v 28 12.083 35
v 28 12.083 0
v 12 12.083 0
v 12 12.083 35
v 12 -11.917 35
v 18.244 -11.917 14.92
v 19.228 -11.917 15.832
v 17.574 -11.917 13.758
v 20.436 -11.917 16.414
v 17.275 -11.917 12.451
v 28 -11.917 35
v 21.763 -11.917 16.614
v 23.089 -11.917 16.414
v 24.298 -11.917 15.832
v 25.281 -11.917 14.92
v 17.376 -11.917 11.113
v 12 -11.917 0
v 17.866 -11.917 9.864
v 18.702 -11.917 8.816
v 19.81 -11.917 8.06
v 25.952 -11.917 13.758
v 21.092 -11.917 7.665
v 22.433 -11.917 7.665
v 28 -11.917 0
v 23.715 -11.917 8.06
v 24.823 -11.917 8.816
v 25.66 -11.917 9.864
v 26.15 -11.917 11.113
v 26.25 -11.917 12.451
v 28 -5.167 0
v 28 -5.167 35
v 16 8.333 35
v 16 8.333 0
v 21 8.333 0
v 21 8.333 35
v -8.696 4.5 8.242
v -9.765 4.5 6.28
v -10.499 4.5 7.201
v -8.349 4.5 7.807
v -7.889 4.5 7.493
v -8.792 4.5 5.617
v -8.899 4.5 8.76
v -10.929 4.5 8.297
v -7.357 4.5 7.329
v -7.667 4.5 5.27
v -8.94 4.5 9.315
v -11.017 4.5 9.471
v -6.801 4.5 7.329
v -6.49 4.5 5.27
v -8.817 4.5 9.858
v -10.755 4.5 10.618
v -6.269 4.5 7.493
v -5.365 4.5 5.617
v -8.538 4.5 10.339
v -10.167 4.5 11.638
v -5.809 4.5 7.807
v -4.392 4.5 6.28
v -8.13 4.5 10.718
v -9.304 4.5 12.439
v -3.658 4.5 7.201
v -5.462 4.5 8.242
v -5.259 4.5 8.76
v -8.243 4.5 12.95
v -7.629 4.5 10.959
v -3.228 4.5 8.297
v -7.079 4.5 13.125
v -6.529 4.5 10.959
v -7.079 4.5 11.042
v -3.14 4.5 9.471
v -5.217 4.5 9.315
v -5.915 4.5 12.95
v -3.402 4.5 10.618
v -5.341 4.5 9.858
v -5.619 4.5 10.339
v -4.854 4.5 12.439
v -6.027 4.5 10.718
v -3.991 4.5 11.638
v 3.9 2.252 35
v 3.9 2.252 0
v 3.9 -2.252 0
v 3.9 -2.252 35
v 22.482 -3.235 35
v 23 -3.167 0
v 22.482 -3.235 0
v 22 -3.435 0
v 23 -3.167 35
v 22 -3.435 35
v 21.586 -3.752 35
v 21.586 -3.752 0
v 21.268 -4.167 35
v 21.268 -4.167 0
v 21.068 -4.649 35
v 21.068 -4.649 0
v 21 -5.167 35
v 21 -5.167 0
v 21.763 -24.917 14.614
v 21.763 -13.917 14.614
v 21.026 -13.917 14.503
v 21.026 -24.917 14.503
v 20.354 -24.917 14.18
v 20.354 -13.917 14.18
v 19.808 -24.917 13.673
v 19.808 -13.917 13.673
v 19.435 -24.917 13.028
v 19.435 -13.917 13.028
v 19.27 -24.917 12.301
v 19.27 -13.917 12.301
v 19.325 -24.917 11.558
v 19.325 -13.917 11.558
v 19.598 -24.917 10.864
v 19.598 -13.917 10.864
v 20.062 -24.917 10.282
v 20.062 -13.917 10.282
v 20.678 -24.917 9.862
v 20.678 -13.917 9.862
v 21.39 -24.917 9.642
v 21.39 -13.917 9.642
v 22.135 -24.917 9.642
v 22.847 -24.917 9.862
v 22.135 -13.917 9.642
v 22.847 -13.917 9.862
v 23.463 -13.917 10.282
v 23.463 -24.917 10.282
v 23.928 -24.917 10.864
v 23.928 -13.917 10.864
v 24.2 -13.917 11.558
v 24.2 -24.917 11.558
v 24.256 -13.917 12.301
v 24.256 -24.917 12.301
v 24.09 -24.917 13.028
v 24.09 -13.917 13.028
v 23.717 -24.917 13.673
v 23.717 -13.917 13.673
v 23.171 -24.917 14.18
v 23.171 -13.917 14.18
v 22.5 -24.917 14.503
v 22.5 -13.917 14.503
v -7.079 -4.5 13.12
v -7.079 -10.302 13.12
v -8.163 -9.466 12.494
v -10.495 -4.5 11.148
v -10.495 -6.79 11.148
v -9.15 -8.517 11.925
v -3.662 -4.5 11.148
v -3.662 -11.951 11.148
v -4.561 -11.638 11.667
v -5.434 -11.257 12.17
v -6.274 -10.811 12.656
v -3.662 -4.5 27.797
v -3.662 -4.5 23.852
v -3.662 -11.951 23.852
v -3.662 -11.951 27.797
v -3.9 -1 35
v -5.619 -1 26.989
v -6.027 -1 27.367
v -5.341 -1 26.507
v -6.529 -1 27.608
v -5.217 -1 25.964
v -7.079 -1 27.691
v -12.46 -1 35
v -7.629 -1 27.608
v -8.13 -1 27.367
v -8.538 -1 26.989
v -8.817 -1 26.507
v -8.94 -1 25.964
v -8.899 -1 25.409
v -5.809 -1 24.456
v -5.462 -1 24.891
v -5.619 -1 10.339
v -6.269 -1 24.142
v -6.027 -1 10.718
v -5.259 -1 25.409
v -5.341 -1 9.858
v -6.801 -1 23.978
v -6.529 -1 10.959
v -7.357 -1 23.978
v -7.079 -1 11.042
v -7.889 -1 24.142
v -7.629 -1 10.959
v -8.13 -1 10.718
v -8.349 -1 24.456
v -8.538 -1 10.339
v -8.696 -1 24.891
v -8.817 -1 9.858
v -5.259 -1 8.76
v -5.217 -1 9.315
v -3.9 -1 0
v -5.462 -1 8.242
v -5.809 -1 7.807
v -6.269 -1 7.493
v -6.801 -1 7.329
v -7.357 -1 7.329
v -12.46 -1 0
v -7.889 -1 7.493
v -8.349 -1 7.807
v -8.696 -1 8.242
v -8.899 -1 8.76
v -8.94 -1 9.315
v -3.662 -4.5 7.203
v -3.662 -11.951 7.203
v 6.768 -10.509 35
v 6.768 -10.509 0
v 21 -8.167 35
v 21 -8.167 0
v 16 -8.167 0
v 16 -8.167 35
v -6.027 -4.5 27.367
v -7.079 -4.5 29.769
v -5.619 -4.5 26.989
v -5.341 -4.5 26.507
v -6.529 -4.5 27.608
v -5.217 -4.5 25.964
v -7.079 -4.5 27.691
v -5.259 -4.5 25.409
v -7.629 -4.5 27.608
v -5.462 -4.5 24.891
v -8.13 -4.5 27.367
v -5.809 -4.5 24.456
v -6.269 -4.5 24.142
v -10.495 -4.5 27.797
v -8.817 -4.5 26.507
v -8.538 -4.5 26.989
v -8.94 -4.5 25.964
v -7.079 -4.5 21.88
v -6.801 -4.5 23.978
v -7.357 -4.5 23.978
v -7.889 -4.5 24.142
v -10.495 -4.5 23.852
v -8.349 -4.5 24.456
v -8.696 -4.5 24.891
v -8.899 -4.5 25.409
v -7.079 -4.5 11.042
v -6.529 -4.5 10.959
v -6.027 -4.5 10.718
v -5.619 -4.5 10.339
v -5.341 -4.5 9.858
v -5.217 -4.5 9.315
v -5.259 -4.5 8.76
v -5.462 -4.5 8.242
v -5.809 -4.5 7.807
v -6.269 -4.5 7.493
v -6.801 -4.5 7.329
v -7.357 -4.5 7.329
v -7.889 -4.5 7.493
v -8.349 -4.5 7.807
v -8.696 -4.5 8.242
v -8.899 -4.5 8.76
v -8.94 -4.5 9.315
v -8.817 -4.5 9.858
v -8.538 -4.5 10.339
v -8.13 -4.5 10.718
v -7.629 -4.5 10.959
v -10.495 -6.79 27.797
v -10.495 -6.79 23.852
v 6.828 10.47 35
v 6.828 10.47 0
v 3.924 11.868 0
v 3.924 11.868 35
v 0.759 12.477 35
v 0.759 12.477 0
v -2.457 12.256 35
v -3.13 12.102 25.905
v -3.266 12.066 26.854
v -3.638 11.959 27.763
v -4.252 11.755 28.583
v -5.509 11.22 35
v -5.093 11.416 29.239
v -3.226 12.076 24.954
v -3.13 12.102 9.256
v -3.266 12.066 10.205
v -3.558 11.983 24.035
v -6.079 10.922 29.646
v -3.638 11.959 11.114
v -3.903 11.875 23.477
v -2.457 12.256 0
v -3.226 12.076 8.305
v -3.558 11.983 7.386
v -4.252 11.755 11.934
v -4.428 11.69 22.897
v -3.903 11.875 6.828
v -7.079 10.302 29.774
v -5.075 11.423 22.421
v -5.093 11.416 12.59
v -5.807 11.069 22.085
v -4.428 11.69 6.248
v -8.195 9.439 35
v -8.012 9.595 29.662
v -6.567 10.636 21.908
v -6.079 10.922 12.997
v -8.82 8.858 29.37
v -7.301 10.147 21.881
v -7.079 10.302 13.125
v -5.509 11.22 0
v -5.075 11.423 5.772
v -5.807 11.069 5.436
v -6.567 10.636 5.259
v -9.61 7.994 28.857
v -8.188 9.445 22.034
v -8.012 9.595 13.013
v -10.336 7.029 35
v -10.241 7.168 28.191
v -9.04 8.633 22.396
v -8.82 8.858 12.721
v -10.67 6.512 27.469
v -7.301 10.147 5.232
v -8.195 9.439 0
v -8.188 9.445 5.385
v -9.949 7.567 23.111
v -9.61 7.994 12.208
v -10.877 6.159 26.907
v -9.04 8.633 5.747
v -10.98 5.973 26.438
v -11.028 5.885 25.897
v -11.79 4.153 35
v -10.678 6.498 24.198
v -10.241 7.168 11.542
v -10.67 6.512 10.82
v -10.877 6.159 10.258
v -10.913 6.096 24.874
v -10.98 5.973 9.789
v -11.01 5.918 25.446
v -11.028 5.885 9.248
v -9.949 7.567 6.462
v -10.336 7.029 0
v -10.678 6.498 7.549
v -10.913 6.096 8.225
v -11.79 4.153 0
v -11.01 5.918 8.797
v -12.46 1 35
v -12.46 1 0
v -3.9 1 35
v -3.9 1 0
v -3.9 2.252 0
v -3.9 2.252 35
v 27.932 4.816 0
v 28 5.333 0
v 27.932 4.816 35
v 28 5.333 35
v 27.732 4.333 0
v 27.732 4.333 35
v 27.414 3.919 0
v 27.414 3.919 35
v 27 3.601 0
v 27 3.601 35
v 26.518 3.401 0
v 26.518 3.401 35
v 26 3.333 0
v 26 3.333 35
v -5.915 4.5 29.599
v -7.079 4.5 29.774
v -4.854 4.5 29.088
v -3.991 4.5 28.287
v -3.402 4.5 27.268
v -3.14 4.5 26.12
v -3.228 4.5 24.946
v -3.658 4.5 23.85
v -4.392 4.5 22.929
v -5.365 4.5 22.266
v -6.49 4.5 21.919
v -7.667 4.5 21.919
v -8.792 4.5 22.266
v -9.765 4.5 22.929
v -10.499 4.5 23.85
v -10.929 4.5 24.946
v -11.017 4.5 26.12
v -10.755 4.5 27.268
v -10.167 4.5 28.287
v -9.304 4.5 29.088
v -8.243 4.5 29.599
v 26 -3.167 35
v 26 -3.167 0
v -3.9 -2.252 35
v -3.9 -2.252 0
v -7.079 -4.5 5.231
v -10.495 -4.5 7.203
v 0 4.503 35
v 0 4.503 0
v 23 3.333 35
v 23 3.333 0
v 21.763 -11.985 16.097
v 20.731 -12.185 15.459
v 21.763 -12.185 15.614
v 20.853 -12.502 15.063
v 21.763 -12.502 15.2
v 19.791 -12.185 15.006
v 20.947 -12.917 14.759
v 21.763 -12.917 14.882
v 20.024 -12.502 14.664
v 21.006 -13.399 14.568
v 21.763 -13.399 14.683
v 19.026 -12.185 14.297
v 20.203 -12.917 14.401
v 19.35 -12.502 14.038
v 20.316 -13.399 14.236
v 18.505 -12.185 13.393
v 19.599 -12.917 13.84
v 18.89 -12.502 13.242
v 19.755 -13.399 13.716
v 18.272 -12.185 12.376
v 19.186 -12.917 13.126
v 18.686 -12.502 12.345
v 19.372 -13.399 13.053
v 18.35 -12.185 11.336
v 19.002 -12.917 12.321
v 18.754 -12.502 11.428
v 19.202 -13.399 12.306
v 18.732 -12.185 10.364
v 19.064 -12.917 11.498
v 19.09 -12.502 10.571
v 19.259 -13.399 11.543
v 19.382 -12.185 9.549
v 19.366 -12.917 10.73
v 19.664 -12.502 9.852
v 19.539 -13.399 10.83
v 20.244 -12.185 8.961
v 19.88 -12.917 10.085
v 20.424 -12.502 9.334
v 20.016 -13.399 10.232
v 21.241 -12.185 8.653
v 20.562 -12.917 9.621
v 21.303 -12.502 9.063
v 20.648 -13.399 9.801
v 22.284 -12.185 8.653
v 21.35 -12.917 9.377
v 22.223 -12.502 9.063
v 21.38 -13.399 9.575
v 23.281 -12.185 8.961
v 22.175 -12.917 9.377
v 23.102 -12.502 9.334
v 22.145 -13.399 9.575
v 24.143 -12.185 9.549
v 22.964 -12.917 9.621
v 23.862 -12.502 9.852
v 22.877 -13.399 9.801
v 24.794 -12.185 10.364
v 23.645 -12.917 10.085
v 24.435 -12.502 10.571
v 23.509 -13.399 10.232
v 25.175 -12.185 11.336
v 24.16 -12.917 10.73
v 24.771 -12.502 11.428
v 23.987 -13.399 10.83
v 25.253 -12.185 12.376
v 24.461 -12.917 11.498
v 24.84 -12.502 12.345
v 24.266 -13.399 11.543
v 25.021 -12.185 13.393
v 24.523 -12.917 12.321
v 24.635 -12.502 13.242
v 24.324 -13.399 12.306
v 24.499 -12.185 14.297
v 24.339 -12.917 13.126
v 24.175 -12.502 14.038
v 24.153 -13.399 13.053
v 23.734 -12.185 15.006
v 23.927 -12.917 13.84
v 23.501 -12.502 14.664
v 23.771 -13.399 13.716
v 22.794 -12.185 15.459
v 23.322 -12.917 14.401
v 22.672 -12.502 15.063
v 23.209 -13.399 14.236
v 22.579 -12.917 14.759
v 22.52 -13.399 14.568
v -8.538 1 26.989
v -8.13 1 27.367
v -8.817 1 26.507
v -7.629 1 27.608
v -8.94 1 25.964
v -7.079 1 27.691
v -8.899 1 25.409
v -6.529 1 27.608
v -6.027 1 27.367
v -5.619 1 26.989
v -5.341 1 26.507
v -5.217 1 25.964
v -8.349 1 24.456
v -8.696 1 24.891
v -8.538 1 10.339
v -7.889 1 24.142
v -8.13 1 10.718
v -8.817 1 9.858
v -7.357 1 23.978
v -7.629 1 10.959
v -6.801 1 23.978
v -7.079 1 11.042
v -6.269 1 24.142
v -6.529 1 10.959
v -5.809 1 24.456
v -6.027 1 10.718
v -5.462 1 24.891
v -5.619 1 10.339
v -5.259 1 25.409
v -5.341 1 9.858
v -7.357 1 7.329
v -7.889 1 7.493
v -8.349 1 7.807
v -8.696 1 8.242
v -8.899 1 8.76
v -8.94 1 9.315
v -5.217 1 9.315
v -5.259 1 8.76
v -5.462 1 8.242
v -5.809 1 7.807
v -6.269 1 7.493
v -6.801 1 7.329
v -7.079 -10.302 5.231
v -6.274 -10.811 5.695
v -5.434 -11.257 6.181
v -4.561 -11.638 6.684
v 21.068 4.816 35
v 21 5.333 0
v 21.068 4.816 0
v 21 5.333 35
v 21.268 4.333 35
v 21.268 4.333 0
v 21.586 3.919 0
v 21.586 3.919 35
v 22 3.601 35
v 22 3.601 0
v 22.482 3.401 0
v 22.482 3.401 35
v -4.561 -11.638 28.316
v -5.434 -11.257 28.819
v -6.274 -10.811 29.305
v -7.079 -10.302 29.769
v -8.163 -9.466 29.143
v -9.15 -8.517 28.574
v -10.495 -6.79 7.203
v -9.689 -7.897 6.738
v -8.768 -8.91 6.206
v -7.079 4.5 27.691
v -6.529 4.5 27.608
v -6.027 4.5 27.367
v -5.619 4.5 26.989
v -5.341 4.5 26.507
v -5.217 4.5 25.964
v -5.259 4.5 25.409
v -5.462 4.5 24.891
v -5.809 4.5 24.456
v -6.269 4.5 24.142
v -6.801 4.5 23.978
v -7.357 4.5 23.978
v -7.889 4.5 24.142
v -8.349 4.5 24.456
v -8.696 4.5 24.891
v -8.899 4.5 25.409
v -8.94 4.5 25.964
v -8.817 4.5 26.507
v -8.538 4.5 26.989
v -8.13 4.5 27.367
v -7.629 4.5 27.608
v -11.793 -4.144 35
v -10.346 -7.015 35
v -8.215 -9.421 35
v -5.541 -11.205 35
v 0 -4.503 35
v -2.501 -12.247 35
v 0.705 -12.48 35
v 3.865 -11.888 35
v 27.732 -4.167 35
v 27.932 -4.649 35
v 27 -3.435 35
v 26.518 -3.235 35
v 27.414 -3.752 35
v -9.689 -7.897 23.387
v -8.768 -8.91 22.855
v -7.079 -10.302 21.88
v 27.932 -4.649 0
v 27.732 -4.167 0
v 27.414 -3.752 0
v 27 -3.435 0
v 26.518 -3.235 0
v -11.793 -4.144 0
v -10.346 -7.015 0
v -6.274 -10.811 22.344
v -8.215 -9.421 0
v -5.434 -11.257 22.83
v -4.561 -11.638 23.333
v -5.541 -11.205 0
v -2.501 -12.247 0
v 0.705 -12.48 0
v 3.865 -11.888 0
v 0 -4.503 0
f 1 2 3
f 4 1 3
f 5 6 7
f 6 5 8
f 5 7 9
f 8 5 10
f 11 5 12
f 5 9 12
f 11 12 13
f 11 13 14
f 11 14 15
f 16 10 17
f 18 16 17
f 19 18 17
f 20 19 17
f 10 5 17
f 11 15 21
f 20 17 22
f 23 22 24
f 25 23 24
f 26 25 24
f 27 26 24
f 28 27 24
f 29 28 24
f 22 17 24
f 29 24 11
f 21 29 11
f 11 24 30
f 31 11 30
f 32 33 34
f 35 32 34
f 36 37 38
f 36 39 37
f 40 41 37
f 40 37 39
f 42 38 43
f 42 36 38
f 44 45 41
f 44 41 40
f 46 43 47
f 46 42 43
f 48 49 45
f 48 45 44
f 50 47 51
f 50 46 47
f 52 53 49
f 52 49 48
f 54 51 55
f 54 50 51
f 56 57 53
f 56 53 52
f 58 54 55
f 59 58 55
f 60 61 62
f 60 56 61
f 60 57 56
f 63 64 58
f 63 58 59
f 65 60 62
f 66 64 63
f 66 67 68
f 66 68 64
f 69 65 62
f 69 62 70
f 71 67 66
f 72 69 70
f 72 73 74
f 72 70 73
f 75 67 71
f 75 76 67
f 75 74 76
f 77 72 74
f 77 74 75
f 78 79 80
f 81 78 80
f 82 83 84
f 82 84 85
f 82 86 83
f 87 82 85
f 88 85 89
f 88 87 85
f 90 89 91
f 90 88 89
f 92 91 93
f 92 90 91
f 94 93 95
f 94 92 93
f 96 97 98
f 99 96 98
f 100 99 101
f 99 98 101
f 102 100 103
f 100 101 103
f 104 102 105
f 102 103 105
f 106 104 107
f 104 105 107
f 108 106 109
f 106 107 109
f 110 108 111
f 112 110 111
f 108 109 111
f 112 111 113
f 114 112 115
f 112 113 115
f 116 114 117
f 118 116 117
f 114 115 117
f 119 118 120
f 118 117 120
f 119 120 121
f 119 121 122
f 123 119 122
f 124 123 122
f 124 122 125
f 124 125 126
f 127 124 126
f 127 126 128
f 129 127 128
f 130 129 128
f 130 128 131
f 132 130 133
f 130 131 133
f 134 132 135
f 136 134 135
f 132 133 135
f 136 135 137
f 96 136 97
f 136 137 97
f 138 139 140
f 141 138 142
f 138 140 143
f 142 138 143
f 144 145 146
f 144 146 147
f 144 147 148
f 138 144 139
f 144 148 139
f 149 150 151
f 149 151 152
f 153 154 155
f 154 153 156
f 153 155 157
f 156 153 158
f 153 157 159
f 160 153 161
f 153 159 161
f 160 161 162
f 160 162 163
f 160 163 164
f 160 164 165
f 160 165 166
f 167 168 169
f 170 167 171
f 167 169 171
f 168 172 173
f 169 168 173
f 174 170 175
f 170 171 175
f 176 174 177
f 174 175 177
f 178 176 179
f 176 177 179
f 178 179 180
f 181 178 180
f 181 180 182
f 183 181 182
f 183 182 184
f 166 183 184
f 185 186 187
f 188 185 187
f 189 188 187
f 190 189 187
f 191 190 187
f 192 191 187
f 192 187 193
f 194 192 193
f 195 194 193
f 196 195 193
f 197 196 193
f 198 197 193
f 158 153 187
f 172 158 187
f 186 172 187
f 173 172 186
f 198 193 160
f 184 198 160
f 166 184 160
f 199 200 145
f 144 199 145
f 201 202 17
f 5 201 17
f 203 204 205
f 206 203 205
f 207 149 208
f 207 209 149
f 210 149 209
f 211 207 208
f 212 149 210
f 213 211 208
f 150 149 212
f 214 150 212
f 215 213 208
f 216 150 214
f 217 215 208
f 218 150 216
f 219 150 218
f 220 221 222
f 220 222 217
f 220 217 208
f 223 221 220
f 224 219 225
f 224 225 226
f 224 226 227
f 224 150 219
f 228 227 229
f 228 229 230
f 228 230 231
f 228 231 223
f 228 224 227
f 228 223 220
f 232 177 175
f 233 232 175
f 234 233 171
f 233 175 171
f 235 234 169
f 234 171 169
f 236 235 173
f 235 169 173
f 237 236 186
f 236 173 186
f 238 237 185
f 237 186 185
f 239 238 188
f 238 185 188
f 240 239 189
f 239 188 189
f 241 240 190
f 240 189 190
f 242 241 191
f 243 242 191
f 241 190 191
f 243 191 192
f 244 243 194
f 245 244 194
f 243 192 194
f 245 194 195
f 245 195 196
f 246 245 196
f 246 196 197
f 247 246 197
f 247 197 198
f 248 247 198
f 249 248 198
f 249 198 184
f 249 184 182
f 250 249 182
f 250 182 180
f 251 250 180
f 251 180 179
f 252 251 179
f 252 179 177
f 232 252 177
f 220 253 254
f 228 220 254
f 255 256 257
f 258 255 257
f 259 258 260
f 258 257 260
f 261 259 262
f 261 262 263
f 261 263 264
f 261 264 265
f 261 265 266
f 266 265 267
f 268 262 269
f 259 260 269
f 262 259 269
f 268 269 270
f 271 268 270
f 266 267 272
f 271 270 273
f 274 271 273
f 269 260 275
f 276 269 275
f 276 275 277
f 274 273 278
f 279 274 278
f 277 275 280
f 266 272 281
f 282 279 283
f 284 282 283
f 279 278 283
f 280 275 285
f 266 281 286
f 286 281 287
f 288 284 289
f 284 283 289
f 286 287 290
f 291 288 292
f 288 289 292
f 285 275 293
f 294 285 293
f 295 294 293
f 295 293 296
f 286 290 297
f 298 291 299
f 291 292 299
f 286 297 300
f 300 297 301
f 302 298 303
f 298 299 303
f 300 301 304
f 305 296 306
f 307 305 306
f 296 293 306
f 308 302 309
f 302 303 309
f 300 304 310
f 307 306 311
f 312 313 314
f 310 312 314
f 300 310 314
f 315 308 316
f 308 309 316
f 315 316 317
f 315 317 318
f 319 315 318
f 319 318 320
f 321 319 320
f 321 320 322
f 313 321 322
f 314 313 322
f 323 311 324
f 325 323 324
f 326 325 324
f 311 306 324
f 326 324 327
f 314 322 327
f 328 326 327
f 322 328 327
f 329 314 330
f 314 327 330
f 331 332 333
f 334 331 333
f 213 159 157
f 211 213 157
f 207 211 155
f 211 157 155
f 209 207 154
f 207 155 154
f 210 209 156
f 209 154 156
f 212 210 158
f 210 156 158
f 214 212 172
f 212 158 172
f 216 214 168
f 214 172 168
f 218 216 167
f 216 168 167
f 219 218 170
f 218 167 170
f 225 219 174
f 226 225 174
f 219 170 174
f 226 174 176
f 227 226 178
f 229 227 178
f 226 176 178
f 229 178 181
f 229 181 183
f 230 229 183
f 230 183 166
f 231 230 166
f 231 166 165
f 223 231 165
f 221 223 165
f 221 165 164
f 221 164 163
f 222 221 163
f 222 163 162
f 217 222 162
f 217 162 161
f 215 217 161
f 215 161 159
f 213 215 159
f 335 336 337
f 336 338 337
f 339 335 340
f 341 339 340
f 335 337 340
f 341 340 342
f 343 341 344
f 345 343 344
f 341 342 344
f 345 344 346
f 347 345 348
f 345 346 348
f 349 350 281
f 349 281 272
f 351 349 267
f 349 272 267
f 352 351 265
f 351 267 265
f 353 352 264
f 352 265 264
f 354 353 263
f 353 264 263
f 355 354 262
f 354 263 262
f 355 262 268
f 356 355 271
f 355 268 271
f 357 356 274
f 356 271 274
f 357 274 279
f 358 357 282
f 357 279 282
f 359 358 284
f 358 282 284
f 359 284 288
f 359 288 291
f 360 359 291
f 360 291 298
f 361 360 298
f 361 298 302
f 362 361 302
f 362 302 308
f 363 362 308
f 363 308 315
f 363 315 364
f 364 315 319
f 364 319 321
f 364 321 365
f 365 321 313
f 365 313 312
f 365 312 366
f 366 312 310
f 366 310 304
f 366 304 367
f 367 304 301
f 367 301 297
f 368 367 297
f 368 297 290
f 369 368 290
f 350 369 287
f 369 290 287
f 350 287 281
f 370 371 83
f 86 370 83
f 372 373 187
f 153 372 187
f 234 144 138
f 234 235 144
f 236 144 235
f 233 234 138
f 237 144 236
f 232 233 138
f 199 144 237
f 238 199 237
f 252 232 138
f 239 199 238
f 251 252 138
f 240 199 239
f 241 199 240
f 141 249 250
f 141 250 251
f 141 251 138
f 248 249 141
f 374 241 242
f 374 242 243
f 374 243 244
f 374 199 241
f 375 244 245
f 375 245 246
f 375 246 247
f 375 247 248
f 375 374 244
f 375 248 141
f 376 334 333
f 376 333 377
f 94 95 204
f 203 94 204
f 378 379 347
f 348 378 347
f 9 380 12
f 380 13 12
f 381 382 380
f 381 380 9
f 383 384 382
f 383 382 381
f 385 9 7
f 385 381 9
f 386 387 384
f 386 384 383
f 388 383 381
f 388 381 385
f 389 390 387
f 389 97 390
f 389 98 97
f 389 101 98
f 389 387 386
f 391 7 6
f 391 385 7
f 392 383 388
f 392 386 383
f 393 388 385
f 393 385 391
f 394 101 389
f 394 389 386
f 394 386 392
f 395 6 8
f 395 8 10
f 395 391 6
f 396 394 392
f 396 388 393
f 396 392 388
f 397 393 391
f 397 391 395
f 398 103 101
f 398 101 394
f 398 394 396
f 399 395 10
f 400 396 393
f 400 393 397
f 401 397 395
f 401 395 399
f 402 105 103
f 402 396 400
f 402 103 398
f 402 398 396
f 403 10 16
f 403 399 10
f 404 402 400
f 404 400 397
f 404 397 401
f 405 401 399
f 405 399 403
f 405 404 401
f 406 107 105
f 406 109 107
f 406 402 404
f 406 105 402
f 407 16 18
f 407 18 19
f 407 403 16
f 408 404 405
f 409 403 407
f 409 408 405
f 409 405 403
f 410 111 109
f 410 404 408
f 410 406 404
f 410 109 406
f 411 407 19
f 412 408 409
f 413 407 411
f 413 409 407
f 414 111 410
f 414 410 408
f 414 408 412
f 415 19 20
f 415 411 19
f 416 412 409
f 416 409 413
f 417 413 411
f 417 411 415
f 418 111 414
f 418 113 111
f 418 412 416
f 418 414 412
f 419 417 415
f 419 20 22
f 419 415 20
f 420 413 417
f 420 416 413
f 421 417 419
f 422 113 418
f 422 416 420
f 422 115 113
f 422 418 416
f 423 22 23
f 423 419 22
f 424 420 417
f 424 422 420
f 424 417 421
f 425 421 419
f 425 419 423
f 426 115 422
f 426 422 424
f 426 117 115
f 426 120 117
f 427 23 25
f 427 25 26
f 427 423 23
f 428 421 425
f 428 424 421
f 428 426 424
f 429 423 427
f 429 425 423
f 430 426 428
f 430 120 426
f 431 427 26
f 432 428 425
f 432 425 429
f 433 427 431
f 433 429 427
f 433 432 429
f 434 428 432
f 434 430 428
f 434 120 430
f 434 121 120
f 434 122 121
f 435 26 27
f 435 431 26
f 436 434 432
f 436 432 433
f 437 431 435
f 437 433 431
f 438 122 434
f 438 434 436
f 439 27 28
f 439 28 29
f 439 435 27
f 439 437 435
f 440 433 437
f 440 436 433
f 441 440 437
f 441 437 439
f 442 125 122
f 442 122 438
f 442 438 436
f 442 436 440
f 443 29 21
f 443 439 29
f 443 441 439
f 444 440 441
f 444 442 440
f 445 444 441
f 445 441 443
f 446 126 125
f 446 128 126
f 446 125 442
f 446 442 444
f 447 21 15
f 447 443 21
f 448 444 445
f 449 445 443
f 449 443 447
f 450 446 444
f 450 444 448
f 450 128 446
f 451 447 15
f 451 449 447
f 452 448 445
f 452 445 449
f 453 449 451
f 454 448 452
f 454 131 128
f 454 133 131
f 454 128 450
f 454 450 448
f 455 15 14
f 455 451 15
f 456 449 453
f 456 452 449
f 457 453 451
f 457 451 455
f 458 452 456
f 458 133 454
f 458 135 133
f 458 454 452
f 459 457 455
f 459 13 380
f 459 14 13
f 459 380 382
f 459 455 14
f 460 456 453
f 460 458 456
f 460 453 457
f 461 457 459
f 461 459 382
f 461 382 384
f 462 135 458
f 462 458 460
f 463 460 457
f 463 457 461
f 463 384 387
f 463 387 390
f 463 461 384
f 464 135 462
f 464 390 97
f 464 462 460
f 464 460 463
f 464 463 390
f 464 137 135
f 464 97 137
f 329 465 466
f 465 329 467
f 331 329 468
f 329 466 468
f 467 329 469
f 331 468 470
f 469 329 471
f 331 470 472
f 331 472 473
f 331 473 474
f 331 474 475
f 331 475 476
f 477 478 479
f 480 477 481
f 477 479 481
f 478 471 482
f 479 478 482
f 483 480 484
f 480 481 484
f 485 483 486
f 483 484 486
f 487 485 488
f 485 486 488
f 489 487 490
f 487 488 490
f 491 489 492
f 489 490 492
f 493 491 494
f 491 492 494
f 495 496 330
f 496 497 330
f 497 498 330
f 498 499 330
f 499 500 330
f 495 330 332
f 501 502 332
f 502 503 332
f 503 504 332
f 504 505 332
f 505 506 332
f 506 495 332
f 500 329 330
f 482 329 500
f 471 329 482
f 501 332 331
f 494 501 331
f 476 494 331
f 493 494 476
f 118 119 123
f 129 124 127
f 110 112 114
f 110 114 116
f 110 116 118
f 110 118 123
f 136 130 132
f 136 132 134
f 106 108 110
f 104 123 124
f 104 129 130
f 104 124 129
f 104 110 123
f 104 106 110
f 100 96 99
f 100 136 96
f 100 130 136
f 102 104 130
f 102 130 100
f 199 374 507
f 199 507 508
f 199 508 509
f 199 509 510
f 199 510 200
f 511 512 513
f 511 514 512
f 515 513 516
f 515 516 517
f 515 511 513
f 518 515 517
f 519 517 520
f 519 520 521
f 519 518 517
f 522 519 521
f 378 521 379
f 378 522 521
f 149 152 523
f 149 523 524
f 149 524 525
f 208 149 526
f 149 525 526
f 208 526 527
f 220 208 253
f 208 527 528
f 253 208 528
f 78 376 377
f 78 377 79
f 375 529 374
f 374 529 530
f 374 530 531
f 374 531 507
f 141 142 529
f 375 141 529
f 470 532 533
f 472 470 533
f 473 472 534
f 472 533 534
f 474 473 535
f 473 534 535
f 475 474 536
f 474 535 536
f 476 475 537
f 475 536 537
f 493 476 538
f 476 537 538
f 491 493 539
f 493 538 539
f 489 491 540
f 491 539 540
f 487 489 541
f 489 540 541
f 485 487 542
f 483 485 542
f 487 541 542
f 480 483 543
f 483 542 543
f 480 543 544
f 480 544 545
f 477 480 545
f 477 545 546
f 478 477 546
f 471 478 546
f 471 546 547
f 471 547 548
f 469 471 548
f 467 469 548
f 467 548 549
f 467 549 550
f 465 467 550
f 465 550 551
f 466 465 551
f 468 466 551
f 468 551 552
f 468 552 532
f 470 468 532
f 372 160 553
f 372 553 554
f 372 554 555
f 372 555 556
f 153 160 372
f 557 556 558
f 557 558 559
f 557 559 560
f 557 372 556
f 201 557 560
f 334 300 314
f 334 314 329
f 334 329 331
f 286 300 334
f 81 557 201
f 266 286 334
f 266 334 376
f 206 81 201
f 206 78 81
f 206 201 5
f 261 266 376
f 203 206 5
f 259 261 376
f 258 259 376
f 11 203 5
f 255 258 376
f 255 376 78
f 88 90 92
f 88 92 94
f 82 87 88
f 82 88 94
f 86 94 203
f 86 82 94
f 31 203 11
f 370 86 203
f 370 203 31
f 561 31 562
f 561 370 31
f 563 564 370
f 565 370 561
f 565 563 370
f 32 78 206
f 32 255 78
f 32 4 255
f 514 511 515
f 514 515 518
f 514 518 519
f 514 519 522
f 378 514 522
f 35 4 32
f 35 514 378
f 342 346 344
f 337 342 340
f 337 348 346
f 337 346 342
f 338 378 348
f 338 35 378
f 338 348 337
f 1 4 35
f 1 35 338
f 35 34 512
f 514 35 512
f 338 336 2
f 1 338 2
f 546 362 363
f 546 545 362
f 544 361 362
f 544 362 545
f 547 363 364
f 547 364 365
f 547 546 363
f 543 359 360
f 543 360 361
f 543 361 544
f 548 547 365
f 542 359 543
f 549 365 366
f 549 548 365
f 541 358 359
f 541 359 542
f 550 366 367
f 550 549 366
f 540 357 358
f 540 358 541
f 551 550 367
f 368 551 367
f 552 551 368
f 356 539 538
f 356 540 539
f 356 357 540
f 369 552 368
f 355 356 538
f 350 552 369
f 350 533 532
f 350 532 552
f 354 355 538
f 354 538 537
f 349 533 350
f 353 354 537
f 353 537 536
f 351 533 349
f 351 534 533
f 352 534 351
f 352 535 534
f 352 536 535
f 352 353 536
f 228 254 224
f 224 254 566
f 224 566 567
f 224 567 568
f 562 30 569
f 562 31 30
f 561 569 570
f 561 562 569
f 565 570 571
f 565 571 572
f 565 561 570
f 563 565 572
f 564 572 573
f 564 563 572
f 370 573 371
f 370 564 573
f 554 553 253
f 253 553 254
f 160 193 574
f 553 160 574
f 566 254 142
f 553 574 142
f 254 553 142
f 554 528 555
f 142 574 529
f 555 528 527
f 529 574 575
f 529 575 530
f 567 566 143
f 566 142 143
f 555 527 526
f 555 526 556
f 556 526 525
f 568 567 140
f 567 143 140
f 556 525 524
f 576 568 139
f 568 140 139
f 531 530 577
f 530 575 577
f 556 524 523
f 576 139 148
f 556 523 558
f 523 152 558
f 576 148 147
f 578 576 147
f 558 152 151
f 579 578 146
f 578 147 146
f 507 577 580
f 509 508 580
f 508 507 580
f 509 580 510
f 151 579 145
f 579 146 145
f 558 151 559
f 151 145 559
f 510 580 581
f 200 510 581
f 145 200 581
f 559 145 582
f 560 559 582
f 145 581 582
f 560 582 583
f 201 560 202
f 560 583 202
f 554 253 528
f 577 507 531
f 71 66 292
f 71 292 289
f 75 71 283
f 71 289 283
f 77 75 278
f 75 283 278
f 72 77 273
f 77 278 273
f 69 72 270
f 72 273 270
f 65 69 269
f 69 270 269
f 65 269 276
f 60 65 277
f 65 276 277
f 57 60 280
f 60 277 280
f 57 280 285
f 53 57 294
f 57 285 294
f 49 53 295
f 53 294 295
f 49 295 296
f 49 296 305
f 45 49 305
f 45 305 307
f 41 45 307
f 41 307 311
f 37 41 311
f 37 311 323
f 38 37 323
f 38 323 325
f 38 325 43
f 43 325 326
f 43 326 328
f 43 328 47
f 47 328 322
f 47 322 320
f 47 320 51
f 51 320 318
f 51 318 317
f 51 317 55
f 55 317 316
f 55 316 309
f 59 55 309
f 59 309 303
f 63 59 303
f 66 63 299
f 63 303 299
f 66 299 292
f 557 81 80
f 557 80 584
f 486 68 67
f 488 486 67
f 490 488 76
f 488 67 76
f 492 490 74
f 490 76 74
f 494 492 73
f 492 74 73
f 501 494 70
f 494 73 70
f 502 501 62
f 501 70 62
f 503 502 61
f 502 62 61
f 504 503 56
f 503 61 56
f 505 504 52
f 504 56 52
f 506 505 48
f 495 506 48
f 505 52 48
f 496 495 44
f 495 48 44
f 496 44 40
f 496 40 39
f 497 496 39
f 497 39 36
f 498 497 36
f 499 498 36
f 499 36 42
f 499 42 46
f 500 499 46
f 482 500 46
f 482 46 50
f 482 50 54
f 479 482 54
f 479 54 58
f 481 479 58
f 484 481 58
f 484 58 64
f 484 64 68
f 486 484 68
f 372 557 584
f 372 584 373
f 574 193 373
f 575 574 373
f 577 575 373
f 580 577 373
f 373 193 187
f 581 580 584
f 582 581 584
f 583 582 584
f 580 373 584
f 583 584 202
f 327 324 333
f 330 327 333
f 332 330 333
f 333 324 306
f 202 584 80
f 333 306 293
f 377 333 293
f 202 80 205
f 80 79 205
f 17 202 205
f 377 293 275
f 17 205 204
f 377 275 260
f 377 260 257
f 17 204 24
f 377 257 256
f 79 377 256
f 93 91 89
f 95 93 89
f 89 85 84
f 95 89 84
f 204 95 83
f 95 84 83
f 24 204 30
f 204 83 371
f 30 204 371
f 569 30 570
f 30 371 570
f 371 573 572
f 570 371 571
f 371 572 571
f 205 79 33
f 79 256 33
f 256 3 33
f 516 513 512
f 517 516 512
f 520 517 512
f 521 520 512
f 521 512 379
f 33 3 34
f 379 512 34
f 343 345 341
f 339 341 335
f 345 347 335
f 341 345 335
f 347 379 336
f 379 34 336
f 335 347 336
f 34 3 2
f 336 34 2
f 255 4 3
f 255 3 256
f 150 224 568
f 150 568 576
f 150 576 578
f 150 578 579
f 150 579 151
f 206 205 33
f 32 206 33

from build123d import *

# Parameters (mm, degrees)
BOSS_EXTRUDE1_DEPTH = 35
SKETCH2_R           = 1.8669
CUT_EXTRUDE1_DEPTH  = 45.791182168
SKETCH3_R           = 3.9497
CUT_EXTRUDE2_DEPTH  = 8
CUT_EXTRUDE3_DEPTH  = 8
BOSS_EXTRUDE2_DEPTH = 35
FILLET1_R           = 2
SKETCH6_R           = 2.5
BOSS_EXTRUDE3_DEPTH = 13
FILLET2_R           = 2


with BuildPart() as part:
    # Sketch1 → Boss-Extrude1 (new body)
    with BuildSketch(Plane.XY):
        with BuildLine():
            ThreePointArc((12.5, 0), (0.500401124, 12.489979933), (-12.459935794, 1))
            Line((-12.459935794, 1), (-3.9, 1))
            Line((-3.9, 1), (-3.9, 2.25166605))
            Line((-3.9, 2.25166605), (0, 4.5033321))
            Line((0, 4.5033321), (3.9, 2.25166605))
            Line((3.9, 2.25166605), (3.9, -2.25166605))
            Line((3.9, -2.25166605), (0, -4.5033321))
            Line((0, -4.5033321), (-3.9, -2.25166605))
            Line((-3.9, -2.25166605), (-3.9, -1))
            Line((-3.9, -1), (-12.459935794, -1))
            ThreePointArc((-12.459935794, -1), (0.500401124, -12.489979933), (12.5, 0))
        make_face()
    extrude(amount=BOSS_EXTRUDE1_DEPTH)

    # Sketch2 → Cut-Extrude1 (cut, through all)
    with BuildSketch(Plane(origin=(0, 12.5, 0), x_dir=(1, 0, 0), z_dir=(0, 1, 0))):
        with Locations(Location((-7.078786681, -9.175485886, 0), (0, 0, 270))):
            Circle(SKETCH2_R)
        with Locations(Location((-7.078786681, -25.824514114, 0), (0, 0, 270))):
            Circle(SKETCH2_R)
    extrude(amount=-CUT_EXTRUDE1_DEPTH, mode=Mode.SUBTRACT)

    # Sketch3 → Cut-Extrude2 (cut)
    with BuildSketch(Plane(origin=(0, 12.5, 0), x_dir=(1, 0, 0), z_dir=(0, 1, 0))):
        with Locations(Location((-7.078786681, -9.175485886, 0), (0, 0, 270))):
            Circle(SKETCH3_R)
        with Locations(Location((-7.078786681, -25.824514114, 0), (0, 0, 270))):
            Circle(SKETCH3_R)
    extrude(amount=-CUT_EXTRUDE2_DEPTH, mode=Mode.SUBTRACT)

    # Sketch4 → Cut-Extrude3 (cut)
    with BuildSketch(Plane(origin=(0, -12.5, 0), x_dir=(-1, 0, 0), z_dir=(0, -1, 0))):
        Polygon((7.078786681, -5.230682437), (3.662486681, -7.203084162), (3.662486681, -11.147887611), (7.078786681, -13.120289335), (10.495086681, -11.147887611), (10.495086681, -7.203084162), align=None)
        Polygon((7.078786681, -21.879710665), (3.662486681, -23.852112389), (3.662486681, -27.796915838), (7.078786681, -29.769317563), (10.495086681, -27.796915838), (10.495086681, -23.852112389), align=None)
    extrude(amount=-CUT_EXTRUDE3_DEPTH, mode=Mode.SUBTRACT)

    # Sketch5 → Boss-Extrude2 (add, through all)
    with BuildSketch(Plane(origin=(0, 0, 0), x_dir=(-1, 0, 0), z_dir=(0, 0, -1))):
        with BuildLine():
            Line((-12, 12.083333333), (-6.827937157, 10.470399905))
            ThreePointArc((-6.827937157, 10.470399905), (-12.499949552, -0.035513444), (-6.768332777, -10.509028091))
            Line((-6.768332777, -10.509028091), (-12, -11.916666667))
            Line((-12, -11.916666667), (-28, -11.916666667))
            Line((-28, -11.916666667), (-28, -3.166666667))
            Line((-28, -3.166666667), (-21, -3.166666667))
            Line((-21, -3.166666667), (-21, -8.166666667))
            Line((-21, -8.166666667), (-16, -8.166666667))
            Line((-16, -8.166666667), (-16, 8.333333333))
            Line((-16, 8.333333333), (-21, 8.333333333))
            Line((-21, 8.333333333), (-21, 3.333333333))
            Line((-21, 3.333333333), (-28, 3.333333333))
            Line((-28, 3.333333333), (-28, 12.083333333))
            Line((-28, 12.083333333), (-12, 12.083333333))
        make_face()
    extrude(amount=-BOSS_EXTRUDE2_DEPTH)

    # Fillet1
    fillet1_edges = [part.edges().sort_by_distance(p)[0] for p in [
        (28, -3.166666667, 17.5),
        (21, -3.166666667, 17.5),
        (21, 3.333333333, 17.5),
        (28, 3.333333333, 17.5),
    ]]
    fillet(fillet1_edges, radius=FILLET1_R)

    # Sketch6 → Boss-Extrude3 (add)
    with BuildSketch(Plane.XZ.offset(11.916666667)):
        with Locations(Location((21.762676708, 12.114369006, 0), (0, 0, 90))):
            Circle(SKETCH6_R)
    extrude(amount=BOSS_EXTRUDE3_DEPTH)

    # Fillet2
    fillet2_edges = [part.edges().sort_by_distance(p)[0] for p in [
        (21.762676708, -11.916666667, 9.614369006),
    ]]
    fillet(fillet2_edges, radius=FILLET2_R)


solid = part.part
